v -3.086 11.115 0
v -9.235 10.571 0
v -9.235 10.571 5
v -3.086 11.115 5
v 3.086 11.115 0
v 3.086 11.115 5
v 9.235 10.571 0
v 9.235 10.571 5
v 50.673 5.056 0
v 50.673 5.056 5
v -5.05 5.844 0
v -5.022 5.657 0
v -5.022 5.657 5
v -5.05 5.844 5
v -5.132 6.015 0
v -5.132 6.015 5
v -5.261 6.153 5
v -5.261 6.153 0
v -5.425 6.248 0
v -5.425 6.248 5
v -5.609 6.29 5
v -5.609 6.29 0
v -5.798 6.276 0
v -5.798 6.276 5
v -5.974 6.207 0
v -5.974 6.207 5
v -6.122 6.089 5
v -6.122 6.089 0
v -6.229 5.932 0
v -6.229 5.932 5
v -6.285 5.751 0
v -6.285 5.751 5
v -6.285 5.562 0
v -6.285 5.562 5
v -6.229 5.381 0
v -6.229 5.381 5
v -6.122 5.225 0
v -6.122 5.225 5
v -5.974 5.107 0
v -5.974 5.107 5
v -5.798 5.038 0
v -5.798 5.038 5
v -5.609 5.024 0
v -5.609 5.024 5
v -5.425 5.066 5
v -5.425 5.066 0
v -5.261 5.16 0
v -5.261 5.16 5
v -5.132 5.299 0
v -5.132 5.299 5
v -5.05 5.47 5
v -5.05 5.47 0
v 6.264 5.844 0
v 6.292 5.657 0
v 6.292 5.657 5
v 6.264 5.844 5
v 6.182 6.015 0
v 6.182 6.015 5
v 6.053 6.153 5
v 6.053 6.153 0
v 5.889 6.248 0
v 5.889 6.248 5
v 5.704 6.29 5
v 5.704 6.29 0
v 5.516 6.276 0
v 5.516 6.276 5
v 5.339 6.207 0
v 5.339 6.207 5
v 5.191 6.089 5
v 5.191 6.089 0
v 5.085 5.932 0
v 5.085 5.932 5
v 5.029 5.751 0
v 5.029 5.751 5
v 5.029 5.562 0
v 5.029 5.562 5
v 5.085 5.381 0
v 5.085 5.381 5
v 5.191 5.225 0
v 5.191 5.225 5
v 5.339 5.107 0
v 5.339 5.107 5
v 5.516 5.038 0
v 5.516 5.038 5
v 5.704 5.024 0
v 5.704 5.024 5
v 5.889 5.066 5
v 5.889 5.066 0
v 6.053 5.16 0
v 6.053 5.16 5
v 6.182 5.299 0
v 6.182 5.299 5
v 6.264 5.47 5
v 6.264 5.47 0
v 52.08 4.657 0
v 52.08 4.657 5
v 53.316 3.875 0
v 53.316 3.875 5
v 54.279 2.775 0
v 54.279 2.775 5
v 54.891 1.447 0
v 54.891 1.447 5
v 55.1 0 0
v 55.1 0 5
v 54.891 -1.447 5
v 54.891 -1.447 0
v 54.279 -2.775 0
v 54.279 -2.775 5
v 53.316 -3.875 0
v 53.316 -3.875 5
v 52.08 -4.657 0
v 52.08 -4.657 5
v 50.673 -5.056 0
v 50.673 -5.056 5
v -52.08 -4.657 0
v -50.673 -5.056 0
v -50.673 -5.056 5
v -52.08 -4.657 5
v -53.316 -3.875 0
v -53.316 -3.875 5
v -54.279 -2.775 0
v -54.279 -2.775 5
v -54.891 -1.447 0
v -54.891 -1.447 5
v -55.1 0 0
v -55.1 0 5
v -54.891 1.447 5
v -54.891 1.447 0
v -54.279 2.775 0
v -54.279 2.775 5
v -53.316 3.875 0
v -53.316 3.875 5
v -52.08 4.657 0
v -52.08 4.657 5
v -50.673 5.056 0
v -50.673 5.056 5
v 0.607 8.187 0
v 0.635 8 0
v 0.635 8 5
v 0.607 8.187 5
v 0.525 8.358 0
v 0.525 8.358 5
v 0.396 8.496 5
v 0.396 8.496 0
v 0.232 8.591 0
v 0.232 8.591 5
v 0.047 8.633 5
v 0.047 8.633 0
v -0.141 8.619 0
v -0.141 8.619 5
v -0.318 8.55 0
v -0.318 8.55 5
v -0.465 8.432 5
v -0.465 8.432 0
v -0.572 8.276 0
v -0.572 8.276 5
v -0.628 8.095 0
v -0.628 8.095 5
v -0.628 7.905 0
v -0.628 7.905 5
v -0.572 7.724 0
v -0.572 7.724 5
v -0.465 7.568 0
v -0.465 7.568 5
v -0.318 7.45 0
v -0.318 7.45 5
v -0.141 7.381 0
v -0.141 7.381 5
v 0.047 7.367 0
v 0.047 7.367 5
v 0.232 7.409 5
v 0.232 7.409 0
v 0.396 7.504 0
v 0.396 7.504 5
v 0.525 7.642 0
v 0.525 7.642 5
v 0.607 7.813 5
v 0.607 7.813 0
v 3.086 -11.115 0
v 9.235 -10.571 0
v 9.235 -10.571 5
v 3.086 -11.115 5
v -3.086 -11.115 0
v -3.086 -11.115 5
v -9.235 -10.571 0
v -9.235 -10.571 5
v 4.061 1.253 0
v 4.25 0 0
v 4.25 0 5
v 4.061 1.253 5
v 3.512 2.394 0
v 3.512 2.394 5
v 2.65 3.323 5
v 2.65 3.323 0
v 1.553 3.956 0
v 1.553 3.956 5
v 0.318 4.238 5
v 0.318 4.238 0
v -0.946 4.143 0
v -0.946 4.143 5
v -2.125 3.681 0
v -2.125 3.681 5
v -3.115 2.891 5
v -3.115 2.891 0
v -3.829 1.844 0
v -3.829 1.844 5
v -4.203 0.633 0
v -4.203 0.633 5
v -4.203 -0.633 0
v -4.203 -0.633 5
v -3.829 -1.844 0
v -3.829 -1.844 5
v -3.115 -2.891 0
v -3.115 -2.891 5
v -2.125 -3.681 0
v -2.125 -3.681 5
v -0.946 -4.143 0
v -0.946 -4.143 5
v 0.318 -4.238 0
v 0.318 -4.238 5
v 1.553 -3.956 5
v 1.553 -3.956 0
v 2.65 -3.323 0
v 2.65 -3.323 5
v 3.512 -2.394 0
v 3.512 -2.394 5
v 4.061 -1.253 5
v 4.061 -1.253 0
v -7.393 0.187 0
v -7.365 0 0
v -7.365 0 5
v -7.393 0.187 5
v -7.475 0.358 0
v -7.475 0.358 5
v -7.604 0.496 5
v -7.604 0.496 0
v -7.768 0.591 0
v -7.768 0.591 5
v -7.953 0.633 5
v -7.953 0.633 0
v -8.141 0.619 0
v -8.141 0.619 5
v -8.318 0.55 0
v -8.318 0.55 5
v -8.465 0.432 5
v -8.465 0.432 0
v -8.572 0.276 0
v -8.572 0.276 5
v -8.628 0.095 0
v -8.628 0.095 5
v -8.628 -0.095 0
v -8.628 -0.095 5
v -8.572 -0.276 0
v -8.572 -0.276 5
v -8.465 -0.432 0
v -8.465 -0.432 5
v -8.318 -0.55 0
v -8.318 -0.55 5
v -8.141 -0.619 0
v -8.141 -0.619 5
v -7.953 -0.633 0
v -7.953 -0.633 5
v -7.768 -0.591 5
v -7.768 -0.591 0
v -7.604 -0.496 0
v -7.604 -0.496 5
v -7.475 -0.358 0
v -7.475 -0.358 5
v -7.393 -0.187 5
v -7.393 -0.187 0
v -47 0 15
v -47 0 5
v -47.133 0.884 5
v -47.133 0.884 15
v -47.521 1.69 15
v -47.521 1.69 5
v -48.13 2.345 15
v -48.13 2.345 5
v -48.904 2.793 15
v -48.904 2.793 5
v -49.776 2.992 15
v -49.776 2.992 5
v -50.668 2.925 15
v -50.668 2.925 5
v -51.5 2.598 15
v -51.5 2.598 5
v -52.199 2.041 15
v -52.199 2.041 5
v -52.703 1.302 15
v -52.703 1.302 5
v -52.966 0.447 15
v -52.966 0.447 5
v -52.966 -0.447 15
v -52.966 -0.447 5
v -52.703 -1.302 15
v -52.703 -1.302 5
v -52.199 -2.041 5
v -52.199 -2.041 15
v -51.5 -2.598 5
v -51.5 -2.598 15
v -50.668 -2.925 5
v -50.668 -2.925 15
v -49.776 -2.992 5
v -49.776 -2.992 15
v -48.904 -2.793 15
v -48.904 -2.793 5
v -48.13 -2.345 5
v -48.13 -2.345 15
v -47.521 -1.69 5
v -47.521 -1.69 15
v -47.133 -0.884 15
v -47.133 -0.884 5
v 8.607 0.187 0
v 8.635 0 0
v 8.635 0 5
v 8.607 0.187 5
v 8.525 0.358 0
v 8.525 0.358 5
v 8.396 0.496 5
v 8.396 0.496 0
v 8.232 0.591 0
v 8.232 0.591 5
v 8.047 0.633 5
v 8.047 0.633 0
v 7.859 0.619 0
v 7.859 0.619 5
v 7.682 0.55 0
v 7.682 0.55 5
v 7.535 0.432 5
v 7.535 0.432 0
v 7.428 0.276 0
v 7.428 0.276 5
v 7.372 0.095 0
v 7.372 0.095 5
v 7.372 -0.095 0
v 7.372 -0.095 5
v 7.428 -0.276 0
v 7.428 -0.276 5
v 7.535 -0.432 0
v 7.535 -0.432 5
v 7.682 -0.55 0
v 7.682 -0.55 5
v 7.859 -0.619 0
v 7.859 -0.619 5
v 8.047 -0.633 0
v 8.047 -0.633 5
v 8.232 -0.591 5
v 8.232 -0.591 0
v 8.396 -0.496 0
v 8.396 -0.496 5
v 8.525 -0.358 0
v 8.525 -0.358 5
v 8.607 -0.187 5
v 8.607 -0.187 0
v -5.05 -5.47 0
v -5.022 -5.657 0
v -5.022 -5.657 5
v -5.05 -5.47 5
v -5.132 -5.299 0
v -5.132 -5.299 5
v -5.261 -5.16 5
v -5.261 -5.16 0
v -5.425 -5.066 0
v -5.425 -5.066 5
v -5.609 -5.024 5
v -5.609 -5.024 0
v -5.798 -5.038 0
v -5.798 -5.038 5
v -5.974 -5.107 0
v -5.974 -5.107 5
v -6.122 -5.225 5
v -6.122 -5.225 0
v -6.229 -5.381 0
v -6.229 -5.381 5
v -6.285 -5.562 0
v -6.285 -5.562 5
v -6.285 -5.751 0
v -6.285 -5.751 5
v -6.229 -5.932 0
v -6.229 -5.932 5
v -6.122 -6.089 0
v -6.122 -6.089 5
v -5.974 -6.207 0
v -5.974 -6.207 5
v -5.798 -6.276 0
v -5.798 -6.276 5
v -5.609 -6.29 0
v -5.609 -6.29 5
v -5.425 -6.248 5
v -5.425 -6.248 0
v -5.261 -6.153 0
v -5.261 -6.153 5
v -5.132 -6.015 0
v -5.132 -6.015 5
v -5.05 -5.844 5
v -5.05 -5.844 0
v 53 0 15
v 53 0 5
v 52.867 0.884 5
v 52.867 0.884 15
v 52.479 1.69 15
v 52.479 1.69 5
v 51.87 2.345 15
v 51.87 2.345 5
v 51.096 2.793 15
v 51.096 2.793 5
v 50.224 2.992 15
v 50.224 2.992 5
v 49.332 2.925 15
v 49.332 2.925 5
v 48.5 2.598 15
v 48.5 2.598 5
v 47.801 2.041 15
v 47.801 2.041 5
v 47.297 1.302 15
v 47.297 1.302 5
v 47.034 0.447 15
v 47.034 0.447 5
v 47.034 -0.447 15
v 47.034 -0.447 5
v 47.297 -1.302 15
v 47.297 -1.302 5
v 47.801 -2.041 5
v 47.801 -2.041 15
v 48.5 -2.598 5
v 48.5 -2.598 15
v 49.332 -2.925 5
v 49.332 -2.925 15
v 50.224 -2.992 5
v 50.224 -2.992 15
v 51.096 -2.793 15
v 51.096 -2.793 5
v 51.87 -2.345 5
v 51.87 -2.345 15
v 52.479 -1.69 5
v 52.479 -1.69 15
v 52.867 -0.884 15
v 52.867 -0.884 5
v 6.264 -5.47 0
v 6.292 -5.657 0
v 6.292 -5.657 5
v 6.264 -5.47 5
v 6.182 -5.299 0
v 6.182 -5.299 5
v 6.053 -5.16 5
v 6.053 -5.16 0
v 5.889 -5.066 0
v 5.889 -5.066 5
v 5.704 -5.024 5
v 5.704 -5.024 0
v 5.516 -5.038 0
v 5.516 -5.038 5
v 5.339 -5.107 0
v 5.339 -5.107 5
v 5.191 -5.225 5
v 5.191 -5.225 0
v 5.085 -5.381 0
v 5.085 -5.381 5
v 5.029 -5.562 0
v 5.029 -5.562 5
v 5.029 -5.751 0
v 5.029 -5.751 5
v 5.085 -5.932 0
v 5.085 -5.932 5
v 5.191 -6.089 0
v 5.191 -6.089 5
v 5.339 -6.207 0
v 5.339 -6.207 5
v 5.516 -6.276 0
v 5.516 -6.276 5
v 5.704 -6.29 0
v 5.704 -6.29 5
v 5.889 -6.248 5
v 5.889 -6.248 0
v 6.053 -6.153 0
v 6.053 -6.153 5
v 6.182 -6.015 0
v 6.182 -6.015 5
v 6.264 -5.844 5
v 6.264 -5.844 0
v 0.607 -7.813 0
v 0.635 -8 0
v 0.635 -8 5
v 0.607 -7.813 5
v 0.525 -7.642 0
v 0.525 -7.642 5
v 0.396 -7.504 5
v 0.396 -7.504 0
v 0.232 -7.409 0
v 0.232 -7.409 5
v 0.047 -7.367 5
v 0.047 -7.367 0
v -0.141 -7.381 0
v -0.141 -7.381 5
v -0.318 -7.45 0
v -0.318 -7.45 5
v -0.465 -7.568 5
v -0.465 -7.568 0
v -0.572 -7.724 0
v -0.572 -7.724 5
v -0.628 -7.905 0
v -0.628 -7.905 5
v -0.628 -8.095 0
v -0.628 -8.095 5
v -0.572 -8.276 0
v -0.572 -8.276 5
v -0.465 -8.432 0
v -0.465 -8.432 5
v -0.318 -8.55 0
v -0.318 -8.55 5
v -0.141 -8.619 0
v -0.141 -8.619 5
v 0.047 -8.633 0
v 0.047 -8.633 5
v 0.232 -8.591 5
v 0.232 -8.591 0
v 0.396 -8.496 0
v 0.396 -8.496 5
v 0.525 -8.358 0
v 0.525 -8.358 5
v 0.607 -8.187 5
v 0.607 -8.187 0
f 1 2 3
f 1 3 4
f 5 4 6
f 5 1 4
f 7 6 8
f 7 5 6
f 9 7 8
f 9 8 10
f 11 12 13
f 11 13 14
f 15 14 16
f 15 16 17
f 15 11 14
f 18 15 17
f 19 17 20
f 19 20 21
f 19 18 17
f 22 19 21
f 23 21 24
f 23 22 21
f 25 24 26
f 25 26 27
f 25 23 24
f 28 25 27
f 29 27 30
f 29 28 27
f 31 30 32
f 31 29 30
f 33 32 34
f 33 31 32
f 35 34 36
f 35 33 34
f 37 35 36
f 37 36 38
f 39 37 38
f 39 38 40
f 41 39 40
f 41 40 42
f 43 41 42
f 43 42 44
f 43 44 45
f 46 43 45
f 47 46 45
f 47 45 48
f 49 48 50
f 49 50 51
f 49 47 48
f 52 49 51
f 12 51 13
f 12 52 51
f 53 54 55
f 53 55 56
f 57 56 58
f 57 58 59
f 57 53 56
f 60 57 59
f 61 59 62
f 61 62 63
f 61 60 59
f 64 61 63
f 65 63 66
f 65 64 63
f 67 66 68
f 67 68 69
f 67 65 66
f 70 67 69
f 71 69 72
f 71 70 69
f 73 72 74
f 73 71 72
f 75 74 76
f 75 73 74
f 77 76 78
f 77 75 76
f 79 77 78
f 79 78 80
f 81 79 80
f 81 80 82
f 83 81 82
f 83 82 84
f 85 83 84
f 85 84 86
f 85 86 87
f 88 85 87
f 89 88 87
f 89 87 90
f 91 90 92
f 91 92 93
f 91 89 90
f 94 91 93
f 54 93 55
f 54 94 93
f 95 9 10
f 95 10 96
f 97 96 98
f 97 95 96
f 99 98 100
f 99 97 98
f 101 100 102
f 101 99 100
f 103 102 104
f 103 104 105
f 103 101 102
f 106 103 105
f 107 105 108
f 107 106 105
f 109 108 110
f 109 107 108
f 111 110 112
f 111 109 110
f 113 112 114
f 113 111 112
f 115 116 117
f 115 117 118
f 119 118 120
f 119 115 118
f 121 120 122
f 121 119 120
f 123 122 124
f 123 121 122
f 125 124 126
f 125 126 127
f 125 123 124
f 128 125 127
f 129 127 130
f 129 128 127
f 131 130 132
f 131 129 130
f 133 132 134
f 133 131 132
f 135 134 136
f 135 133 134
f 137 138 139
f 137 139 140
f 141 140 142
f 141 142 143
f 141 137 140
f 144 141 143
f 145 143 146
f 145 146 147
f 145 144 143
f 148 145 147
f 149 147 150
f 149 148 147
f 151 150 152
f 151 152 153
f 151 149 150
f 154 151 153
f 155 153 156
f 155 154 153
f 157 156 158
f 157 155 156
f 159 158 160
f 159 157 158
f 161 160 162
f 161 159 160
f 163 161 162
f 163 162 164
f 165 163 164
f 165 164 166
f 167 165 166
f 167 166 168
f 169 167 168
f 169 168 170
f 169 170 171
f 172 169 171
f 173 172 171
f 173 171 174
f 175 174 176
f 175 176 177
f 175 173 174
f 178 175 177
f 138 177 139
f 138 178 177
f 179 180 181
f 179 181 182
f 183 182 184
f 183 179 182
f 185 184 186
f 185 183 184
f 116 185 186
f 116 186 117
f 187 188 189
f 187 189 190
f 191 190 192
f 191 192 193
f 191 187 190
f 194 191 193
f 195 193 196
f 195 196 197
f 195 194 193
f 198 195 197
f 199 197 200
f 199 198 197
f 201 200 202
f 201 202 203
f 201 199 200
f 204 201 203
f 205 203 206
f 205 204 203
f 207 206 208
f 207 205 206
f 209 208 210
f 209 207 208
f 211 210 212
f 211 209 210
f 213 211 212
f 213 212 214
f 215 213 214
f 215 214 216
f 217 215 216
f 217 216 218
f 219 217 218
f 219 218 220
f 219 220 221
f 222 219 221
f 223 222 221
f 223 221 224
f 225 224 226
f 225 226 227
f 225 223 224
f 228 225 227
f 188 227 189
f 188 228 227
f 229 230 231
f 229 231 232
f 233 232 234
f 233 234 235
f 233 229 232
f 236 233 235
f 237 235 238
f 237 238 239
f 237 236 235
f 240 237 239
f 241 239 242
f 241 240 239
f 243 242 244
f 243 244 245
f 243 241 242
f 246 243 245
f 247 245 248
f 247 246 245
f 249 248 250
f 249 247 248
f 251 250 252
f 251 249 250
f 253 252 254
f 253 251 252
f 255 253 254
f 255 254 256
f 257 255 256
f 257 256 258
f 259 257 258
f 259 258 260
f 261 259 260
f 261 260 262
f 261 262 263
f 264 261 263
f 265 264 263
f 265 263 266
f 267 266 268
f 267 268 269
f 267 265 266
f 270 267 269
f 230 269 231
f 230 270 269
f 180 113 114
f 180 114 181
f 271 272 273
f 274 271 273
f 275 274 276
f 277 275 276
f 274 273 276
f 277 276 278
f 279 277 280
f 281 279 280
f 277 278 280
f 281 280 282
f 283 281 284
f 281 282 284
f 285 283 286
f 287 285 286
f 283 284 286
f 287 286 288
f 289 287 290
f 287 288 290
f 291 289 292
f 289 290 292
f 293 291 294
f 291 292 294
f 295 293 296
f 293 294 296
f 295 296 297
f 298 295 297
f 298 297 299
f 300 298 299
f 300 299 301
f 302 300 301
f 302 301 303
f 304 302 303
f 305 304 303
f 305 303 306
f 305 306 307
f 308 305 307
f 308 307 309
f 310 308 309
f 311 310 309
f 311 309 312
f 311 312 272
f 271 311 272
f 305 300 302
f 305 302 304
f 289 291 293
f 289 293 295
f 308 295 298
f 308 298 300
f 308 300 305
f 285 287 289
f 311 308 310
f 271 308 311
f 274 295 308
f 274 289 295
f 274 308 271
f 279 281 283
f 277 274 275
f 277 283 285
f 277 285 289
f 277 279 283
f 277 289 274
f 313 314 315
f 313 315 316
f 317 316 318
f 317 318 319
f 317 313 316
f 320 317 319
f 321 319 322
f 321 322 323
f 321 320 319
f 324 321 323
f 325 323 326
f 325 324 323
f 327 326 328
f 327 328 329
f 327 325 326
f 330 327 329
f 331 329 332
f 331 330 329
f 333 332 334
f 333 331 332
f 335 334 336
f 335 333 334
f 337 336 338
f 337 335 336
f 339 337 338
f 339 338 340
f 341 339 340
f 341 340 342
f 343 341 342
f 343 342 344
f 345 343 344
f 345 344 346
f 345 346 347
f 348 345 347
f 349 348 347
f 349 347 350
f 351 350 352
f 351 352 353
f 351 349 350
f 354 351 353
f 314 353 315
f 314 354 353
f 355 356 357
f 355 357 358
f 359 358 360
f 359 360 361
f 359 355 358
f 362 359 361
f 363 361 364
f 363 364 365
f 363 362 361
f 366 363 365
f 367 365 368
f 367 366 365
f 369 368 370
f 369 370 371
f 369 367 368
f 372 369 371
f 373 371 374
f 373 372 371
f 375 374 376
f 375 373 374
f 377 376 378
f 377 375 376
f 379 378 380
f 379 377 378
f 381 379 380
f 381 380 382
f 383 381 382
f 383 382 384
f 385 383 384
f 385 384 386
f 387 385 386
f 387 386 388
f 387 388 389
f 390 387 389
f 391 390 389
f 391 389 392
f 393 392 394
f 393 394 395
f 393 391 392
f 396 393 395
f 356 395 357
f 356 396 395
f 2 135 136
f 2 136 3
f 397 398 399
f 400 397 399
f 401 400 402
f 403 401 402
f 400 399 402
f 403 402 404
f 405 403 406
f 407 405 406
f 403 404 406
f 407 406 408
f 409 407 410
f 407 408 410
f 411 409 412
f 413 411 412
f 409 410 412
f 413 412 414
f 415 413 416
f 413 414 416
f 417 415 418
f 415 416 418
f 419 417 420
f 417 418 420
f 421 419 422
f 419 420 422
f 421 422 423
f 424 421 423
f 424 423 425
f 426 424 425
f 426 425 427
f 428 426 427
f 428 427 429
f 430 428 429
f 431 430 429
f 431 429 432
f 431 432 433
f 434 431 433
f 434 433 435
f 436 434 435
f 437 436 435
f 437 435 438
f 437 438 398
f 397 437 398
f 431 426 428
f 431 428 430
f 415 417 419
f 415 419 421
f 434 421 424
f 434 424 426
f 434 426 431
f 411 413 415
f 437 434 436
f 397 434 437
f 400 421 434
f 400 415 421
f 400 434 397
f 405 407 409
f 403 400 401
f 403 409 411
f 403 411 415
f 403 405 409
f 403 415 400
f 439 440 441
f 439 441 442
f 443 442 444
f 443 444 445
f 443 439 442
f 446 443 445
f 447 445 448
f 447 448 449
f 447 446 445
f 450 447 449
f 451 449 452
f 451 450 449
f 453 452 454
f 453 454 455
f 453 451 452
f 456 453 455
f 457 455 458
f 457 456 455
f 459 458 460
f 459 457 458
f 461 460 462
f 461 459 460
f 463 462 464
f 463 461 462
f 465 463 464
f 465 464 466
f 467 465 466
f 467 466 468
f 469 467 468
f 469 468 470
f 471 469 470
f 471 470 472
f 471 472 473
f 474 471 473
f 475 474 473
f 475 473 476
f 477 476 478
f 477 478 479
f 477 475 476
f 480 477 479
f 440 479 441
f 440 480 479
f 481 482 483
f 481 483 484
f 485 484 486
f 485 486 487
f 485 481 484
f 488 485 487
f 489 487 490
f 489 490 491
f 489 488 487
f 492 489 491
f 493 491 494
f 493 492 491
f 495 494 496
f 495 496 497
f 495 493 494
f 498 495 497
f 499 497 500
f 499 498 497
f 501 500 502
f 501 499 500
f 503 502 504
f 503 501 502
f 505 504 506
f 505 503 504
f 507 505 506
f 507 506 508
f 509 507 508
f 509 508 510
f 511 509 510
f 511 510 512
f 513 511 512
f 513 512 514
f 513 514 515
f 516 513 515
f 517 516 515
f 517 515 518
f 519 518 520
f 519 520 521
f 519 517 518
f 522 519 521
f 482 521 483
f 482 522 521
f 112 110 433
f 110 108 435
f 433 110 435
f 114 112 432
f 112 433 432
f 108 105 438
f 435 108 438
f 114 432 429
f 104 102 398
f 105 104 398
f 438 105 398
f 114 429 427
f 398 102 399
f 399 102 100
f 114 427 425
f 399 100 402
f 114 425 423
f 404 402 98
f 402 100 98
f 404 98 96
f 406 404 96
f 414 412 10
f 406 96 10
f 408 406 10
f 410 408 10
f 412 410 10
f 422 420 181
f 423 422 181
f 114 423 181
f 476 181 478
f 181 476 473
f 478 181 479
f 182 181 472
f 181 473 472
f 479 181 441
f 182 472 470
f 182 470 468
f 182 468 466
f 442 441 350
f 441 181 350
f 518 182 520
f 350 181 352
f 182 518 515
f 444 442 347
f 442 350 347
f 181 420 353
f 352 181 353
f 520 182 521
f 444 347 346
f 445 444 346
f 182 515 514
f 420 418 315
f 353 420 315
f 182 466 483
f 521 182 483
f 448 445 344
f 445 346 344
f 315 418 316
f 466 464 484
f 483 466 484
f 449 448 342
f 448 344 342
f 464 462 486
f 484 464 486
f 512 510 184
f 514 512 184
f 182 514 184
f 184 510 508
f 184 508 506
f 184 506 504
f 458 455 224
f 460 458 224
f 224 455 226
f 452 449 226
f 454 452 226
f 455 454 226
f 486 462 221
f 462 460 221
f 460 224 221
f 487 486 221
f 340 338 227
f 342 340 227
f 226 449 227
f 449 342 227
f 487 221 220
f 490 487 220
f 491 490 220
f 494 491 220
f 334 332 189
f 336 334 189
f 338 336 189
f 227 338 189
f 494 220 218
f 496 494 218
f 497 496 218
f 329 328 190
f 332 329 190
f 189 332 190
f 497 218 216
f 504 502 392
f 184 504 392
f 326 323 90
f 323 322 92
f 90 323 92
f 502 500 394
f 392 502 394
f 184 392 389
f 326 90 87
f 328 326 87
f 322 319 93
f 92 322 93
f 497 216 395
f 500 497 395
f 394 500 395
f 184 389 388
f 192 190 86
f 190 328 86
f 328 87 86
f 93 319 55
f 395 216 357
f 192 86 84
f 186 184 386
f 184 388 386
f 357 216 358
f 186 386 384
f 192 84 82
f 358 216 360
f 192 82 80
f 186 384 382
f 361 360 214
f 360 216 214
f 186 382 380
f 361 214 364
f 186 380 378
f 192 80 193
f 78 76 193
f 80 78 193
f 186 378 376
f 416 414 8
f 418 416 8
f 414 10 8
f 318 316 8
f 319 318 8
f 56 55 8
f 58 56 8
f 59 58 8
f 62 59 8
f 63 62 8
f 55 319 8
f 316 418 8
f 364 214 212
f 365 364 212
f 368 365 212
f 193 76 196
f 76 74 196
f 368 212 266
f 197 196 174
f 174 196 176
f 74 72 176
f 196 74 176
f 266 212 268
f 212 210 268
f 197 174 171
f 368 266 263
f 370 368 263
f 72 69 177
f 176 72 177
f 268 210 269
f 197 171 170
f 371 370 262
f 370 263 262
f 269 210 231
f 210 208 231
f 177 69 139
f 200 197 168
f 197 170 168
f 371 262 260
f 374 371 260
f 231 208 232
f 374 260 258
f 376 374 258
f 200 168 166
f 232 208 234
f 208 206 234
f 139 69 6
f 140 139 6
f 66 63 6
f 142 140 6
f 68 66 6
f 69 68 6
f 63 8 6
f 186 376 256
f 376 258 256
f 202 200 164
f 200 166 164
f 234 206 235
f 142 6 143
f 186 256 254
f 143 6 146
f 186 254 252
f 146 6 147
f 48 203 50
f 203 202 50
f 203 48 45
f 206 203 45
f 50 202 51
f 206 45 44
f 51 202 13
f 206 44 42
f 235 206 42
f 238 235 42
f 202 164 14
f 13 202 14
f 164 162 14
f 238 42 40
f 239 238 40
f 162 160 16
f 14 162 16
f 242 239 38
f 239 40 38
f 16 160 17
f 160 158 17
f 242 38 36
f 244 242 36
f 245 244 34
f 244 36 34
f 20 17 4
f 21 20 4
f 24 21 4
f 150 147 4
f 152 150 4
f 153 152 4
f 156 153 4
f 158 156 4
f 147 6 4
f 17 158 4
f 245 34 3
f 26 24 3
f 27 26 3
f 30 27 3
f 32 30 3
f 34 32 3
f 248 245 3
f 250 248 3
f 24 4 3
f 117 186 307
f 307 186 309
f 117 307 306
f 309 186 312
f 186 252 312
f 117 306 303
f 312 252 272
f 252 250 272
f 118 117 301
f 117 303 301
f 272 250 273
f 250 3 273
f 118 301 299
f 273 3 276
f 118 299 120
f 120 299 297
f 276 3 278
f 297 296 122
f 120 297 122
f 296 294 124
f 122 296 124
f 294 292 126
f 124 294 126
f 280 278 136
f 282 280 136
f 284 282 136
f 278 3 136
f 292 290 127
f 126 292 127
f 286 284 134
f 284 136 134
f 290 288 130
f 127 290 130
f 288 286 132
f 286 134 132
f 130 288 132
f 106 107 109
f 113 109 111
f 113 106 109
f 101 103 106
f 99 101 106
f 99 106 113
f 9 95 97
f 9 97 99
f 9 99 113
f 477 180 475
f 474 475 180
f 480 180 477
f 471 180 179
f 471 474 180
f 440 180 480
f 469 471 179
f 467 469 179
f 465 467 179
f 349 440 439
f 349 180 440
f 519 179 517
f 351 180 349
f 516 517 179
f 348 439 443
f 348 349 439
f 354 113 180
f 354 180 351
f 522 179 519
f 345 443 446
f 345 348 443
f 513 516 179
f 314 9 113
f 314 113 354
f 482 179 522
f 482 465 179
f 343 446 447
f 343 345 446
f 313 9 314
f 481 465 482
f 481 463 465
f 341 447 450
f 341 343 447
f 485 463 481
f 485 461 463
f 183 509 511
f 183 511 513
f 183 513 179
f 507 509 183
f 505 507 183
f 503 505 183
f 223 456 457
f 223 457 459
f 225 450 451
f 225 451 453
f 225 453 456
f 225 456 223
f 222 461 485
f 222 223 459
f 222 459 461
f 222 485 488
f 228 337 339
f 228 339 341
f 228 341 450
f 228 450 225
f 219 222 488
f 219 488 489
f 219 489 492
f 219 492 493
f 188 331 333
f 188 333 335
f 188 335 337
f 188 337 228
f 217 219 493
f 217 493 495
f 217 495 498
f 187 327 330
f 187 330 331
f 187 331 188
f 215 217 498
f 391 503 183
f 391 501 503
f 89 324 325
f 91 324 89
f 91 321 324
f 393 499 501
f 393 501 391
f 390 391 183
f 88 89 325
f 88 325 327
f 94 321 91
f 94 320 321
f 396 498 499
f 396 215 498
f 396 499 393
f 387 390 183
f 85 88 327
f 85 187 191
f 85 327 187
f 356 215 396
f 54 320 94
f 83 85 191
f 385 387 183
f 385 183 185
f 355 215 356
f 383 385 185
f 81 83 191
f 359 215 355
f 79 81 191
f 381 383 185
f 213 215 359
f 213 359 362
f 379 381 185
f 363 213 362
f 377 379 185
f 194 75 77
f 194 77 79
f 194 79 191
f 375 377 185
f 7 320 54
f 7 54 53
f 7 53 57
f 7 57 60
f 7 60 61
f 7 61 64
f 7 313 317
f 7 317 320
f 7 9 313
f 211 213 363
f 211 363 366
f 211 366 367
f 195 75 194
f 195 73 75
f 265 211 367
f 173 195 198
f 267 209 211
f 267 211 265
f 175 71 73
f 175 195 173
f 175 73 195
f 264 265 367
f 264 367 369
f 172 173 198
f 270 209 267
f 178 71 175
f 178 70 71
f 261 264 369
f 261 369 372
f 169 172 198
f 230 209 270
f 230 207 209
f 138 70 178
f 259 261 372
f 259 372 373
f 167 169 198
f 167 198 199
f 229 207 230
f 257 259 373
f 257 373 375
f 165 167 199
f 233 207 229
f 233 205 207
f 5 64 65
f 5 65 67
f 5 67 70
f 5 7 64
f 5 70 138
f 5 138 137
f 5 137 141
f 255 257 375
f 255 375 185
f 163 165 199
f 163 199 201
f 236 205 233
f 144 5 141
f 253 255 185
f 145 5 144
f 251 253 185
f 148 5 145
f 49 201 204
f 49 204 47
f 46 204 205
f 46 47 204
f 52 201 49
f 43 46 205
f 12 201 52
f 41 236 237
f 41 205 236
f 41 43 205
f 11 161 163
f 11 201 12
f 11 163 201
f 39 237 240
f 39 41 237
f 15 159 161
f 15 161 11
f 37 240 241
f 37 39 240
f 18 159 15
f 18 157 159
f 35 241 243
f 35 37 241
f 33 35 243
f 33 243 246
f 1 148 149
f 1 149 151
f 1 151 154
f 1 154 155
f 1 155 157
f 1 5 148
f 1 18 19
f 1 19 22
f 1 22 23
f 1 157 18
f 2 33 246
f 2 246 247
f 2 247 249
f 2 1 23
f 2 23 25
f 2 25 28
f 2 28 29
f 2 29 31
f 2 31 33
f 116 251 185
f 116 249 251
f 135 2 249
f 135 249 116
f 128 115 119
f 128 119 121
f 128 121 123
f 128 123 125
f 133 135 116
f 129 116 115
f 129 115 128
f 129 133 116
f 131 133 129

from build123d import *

# Parameters (mm, degrees)
SZKIC1_R                    = 4.25
SZKIC1_R_2                  = 0.635
SZKIC1_R_3                  = 3
DODANIE_WYCI_GNI_CIE1_DEPTH = 5
SZKIC1_2_R                  = 3
DODANIE_WYCI_GNI_CIE2_DEPTH = 15


with BuildPart() as part:
    # Szkic1 → Dodanie-wyci_gni_cie1 (new body)
    with BuildSketch(Plane.XY):
        with BuildLine():
            Line((-50.67287635, 5.055665151), (-9.235111676, 10.570763761))
            ThreePointArc((-9.235111676, 10.570763761), (0, 11.182632843), (9.235111676, 10.570763761))
            Line((9.235111676, 10.570763761), (50.67287635, 5.055665151))
            ThreePointArc((50.67287635, 5.055665151), (55.100246338, 0), (50.67287635, -5.055665151))
            Line((50.67287635, -5.055665151), (9.235111676, -10.570763761))
            ThreePointArc((9.235111676, -10.570763761), (0, -11.182632843), (-9.235111676, -10.570763761))
            Line((-9.235111676, -10.570763761), (-50.67287635, -5.055665151))
            ThreePointArc((-50.67287635, -5.055665151), (-55.100246338, 0), (-50.67287635, 5.055665151))
        make_face()
        Circle(SZKIC1_R, mode=Mode.SUBTRACT)
        with Locations((-5.656854249, 5.656854249)):
            Circle(SZKIC1_R_2, mode=Mode.SUBTRACT)
        with Locations((-8, 0)):
            Circle(SZKIC1_R_2, mode=Mode.SUBTRACT)
        with Locations((0, 8)):
            Circle(SZKIC1_R_2, mode=Mode.SUBTRACT)
        with Locations((5.656854249, 5.656854249)):
            Circle(SZKIC1_R_2, mode=Mode.SUBTRACT)
        with Locations((-50, 0)):
            Circle(SZKIC1_R_3, mode=Mode.SUBTRACT)
        with Locations((50, 0)):
            Circle(SZKIC1_R_3, mode=Mode.SUBTRACT)
        with Locations((8, 0)):
            Circle(SZKIC1_R_2, mode=Mode.SUBTRACT)
        with Locations((5.656854249, -5.656854249)):
            Circle(SZKIC1_R_2, mode=Mode.SUBTRACT)
        with Locations((0, -8)):
            Circle(SZKIC1_R_2, mode=Mode.SUBTRACT)
        with Locations((-5.656854249, -5.656854249)):
            Circle(SZKIC1_R_2, mode=Mode.SUBTRACT)
    extrude(amount=DODANIE_WYCI_GNI_CIE1_DEPTH)

    # Szkic1_2 → Dodanie-wyci_gni_cie2 (add)
    with BuildSketch(Plane.XY):
        with Locations((-50, 0)):
            Circle(SZKIC1_2_R)
        with Locations((50, 0)):
            Circle(SZKIC1_2_R)
    extrude(amount=DODANIE_WYCI_GNI_CIE2_DEPTH)


solid = part.part
